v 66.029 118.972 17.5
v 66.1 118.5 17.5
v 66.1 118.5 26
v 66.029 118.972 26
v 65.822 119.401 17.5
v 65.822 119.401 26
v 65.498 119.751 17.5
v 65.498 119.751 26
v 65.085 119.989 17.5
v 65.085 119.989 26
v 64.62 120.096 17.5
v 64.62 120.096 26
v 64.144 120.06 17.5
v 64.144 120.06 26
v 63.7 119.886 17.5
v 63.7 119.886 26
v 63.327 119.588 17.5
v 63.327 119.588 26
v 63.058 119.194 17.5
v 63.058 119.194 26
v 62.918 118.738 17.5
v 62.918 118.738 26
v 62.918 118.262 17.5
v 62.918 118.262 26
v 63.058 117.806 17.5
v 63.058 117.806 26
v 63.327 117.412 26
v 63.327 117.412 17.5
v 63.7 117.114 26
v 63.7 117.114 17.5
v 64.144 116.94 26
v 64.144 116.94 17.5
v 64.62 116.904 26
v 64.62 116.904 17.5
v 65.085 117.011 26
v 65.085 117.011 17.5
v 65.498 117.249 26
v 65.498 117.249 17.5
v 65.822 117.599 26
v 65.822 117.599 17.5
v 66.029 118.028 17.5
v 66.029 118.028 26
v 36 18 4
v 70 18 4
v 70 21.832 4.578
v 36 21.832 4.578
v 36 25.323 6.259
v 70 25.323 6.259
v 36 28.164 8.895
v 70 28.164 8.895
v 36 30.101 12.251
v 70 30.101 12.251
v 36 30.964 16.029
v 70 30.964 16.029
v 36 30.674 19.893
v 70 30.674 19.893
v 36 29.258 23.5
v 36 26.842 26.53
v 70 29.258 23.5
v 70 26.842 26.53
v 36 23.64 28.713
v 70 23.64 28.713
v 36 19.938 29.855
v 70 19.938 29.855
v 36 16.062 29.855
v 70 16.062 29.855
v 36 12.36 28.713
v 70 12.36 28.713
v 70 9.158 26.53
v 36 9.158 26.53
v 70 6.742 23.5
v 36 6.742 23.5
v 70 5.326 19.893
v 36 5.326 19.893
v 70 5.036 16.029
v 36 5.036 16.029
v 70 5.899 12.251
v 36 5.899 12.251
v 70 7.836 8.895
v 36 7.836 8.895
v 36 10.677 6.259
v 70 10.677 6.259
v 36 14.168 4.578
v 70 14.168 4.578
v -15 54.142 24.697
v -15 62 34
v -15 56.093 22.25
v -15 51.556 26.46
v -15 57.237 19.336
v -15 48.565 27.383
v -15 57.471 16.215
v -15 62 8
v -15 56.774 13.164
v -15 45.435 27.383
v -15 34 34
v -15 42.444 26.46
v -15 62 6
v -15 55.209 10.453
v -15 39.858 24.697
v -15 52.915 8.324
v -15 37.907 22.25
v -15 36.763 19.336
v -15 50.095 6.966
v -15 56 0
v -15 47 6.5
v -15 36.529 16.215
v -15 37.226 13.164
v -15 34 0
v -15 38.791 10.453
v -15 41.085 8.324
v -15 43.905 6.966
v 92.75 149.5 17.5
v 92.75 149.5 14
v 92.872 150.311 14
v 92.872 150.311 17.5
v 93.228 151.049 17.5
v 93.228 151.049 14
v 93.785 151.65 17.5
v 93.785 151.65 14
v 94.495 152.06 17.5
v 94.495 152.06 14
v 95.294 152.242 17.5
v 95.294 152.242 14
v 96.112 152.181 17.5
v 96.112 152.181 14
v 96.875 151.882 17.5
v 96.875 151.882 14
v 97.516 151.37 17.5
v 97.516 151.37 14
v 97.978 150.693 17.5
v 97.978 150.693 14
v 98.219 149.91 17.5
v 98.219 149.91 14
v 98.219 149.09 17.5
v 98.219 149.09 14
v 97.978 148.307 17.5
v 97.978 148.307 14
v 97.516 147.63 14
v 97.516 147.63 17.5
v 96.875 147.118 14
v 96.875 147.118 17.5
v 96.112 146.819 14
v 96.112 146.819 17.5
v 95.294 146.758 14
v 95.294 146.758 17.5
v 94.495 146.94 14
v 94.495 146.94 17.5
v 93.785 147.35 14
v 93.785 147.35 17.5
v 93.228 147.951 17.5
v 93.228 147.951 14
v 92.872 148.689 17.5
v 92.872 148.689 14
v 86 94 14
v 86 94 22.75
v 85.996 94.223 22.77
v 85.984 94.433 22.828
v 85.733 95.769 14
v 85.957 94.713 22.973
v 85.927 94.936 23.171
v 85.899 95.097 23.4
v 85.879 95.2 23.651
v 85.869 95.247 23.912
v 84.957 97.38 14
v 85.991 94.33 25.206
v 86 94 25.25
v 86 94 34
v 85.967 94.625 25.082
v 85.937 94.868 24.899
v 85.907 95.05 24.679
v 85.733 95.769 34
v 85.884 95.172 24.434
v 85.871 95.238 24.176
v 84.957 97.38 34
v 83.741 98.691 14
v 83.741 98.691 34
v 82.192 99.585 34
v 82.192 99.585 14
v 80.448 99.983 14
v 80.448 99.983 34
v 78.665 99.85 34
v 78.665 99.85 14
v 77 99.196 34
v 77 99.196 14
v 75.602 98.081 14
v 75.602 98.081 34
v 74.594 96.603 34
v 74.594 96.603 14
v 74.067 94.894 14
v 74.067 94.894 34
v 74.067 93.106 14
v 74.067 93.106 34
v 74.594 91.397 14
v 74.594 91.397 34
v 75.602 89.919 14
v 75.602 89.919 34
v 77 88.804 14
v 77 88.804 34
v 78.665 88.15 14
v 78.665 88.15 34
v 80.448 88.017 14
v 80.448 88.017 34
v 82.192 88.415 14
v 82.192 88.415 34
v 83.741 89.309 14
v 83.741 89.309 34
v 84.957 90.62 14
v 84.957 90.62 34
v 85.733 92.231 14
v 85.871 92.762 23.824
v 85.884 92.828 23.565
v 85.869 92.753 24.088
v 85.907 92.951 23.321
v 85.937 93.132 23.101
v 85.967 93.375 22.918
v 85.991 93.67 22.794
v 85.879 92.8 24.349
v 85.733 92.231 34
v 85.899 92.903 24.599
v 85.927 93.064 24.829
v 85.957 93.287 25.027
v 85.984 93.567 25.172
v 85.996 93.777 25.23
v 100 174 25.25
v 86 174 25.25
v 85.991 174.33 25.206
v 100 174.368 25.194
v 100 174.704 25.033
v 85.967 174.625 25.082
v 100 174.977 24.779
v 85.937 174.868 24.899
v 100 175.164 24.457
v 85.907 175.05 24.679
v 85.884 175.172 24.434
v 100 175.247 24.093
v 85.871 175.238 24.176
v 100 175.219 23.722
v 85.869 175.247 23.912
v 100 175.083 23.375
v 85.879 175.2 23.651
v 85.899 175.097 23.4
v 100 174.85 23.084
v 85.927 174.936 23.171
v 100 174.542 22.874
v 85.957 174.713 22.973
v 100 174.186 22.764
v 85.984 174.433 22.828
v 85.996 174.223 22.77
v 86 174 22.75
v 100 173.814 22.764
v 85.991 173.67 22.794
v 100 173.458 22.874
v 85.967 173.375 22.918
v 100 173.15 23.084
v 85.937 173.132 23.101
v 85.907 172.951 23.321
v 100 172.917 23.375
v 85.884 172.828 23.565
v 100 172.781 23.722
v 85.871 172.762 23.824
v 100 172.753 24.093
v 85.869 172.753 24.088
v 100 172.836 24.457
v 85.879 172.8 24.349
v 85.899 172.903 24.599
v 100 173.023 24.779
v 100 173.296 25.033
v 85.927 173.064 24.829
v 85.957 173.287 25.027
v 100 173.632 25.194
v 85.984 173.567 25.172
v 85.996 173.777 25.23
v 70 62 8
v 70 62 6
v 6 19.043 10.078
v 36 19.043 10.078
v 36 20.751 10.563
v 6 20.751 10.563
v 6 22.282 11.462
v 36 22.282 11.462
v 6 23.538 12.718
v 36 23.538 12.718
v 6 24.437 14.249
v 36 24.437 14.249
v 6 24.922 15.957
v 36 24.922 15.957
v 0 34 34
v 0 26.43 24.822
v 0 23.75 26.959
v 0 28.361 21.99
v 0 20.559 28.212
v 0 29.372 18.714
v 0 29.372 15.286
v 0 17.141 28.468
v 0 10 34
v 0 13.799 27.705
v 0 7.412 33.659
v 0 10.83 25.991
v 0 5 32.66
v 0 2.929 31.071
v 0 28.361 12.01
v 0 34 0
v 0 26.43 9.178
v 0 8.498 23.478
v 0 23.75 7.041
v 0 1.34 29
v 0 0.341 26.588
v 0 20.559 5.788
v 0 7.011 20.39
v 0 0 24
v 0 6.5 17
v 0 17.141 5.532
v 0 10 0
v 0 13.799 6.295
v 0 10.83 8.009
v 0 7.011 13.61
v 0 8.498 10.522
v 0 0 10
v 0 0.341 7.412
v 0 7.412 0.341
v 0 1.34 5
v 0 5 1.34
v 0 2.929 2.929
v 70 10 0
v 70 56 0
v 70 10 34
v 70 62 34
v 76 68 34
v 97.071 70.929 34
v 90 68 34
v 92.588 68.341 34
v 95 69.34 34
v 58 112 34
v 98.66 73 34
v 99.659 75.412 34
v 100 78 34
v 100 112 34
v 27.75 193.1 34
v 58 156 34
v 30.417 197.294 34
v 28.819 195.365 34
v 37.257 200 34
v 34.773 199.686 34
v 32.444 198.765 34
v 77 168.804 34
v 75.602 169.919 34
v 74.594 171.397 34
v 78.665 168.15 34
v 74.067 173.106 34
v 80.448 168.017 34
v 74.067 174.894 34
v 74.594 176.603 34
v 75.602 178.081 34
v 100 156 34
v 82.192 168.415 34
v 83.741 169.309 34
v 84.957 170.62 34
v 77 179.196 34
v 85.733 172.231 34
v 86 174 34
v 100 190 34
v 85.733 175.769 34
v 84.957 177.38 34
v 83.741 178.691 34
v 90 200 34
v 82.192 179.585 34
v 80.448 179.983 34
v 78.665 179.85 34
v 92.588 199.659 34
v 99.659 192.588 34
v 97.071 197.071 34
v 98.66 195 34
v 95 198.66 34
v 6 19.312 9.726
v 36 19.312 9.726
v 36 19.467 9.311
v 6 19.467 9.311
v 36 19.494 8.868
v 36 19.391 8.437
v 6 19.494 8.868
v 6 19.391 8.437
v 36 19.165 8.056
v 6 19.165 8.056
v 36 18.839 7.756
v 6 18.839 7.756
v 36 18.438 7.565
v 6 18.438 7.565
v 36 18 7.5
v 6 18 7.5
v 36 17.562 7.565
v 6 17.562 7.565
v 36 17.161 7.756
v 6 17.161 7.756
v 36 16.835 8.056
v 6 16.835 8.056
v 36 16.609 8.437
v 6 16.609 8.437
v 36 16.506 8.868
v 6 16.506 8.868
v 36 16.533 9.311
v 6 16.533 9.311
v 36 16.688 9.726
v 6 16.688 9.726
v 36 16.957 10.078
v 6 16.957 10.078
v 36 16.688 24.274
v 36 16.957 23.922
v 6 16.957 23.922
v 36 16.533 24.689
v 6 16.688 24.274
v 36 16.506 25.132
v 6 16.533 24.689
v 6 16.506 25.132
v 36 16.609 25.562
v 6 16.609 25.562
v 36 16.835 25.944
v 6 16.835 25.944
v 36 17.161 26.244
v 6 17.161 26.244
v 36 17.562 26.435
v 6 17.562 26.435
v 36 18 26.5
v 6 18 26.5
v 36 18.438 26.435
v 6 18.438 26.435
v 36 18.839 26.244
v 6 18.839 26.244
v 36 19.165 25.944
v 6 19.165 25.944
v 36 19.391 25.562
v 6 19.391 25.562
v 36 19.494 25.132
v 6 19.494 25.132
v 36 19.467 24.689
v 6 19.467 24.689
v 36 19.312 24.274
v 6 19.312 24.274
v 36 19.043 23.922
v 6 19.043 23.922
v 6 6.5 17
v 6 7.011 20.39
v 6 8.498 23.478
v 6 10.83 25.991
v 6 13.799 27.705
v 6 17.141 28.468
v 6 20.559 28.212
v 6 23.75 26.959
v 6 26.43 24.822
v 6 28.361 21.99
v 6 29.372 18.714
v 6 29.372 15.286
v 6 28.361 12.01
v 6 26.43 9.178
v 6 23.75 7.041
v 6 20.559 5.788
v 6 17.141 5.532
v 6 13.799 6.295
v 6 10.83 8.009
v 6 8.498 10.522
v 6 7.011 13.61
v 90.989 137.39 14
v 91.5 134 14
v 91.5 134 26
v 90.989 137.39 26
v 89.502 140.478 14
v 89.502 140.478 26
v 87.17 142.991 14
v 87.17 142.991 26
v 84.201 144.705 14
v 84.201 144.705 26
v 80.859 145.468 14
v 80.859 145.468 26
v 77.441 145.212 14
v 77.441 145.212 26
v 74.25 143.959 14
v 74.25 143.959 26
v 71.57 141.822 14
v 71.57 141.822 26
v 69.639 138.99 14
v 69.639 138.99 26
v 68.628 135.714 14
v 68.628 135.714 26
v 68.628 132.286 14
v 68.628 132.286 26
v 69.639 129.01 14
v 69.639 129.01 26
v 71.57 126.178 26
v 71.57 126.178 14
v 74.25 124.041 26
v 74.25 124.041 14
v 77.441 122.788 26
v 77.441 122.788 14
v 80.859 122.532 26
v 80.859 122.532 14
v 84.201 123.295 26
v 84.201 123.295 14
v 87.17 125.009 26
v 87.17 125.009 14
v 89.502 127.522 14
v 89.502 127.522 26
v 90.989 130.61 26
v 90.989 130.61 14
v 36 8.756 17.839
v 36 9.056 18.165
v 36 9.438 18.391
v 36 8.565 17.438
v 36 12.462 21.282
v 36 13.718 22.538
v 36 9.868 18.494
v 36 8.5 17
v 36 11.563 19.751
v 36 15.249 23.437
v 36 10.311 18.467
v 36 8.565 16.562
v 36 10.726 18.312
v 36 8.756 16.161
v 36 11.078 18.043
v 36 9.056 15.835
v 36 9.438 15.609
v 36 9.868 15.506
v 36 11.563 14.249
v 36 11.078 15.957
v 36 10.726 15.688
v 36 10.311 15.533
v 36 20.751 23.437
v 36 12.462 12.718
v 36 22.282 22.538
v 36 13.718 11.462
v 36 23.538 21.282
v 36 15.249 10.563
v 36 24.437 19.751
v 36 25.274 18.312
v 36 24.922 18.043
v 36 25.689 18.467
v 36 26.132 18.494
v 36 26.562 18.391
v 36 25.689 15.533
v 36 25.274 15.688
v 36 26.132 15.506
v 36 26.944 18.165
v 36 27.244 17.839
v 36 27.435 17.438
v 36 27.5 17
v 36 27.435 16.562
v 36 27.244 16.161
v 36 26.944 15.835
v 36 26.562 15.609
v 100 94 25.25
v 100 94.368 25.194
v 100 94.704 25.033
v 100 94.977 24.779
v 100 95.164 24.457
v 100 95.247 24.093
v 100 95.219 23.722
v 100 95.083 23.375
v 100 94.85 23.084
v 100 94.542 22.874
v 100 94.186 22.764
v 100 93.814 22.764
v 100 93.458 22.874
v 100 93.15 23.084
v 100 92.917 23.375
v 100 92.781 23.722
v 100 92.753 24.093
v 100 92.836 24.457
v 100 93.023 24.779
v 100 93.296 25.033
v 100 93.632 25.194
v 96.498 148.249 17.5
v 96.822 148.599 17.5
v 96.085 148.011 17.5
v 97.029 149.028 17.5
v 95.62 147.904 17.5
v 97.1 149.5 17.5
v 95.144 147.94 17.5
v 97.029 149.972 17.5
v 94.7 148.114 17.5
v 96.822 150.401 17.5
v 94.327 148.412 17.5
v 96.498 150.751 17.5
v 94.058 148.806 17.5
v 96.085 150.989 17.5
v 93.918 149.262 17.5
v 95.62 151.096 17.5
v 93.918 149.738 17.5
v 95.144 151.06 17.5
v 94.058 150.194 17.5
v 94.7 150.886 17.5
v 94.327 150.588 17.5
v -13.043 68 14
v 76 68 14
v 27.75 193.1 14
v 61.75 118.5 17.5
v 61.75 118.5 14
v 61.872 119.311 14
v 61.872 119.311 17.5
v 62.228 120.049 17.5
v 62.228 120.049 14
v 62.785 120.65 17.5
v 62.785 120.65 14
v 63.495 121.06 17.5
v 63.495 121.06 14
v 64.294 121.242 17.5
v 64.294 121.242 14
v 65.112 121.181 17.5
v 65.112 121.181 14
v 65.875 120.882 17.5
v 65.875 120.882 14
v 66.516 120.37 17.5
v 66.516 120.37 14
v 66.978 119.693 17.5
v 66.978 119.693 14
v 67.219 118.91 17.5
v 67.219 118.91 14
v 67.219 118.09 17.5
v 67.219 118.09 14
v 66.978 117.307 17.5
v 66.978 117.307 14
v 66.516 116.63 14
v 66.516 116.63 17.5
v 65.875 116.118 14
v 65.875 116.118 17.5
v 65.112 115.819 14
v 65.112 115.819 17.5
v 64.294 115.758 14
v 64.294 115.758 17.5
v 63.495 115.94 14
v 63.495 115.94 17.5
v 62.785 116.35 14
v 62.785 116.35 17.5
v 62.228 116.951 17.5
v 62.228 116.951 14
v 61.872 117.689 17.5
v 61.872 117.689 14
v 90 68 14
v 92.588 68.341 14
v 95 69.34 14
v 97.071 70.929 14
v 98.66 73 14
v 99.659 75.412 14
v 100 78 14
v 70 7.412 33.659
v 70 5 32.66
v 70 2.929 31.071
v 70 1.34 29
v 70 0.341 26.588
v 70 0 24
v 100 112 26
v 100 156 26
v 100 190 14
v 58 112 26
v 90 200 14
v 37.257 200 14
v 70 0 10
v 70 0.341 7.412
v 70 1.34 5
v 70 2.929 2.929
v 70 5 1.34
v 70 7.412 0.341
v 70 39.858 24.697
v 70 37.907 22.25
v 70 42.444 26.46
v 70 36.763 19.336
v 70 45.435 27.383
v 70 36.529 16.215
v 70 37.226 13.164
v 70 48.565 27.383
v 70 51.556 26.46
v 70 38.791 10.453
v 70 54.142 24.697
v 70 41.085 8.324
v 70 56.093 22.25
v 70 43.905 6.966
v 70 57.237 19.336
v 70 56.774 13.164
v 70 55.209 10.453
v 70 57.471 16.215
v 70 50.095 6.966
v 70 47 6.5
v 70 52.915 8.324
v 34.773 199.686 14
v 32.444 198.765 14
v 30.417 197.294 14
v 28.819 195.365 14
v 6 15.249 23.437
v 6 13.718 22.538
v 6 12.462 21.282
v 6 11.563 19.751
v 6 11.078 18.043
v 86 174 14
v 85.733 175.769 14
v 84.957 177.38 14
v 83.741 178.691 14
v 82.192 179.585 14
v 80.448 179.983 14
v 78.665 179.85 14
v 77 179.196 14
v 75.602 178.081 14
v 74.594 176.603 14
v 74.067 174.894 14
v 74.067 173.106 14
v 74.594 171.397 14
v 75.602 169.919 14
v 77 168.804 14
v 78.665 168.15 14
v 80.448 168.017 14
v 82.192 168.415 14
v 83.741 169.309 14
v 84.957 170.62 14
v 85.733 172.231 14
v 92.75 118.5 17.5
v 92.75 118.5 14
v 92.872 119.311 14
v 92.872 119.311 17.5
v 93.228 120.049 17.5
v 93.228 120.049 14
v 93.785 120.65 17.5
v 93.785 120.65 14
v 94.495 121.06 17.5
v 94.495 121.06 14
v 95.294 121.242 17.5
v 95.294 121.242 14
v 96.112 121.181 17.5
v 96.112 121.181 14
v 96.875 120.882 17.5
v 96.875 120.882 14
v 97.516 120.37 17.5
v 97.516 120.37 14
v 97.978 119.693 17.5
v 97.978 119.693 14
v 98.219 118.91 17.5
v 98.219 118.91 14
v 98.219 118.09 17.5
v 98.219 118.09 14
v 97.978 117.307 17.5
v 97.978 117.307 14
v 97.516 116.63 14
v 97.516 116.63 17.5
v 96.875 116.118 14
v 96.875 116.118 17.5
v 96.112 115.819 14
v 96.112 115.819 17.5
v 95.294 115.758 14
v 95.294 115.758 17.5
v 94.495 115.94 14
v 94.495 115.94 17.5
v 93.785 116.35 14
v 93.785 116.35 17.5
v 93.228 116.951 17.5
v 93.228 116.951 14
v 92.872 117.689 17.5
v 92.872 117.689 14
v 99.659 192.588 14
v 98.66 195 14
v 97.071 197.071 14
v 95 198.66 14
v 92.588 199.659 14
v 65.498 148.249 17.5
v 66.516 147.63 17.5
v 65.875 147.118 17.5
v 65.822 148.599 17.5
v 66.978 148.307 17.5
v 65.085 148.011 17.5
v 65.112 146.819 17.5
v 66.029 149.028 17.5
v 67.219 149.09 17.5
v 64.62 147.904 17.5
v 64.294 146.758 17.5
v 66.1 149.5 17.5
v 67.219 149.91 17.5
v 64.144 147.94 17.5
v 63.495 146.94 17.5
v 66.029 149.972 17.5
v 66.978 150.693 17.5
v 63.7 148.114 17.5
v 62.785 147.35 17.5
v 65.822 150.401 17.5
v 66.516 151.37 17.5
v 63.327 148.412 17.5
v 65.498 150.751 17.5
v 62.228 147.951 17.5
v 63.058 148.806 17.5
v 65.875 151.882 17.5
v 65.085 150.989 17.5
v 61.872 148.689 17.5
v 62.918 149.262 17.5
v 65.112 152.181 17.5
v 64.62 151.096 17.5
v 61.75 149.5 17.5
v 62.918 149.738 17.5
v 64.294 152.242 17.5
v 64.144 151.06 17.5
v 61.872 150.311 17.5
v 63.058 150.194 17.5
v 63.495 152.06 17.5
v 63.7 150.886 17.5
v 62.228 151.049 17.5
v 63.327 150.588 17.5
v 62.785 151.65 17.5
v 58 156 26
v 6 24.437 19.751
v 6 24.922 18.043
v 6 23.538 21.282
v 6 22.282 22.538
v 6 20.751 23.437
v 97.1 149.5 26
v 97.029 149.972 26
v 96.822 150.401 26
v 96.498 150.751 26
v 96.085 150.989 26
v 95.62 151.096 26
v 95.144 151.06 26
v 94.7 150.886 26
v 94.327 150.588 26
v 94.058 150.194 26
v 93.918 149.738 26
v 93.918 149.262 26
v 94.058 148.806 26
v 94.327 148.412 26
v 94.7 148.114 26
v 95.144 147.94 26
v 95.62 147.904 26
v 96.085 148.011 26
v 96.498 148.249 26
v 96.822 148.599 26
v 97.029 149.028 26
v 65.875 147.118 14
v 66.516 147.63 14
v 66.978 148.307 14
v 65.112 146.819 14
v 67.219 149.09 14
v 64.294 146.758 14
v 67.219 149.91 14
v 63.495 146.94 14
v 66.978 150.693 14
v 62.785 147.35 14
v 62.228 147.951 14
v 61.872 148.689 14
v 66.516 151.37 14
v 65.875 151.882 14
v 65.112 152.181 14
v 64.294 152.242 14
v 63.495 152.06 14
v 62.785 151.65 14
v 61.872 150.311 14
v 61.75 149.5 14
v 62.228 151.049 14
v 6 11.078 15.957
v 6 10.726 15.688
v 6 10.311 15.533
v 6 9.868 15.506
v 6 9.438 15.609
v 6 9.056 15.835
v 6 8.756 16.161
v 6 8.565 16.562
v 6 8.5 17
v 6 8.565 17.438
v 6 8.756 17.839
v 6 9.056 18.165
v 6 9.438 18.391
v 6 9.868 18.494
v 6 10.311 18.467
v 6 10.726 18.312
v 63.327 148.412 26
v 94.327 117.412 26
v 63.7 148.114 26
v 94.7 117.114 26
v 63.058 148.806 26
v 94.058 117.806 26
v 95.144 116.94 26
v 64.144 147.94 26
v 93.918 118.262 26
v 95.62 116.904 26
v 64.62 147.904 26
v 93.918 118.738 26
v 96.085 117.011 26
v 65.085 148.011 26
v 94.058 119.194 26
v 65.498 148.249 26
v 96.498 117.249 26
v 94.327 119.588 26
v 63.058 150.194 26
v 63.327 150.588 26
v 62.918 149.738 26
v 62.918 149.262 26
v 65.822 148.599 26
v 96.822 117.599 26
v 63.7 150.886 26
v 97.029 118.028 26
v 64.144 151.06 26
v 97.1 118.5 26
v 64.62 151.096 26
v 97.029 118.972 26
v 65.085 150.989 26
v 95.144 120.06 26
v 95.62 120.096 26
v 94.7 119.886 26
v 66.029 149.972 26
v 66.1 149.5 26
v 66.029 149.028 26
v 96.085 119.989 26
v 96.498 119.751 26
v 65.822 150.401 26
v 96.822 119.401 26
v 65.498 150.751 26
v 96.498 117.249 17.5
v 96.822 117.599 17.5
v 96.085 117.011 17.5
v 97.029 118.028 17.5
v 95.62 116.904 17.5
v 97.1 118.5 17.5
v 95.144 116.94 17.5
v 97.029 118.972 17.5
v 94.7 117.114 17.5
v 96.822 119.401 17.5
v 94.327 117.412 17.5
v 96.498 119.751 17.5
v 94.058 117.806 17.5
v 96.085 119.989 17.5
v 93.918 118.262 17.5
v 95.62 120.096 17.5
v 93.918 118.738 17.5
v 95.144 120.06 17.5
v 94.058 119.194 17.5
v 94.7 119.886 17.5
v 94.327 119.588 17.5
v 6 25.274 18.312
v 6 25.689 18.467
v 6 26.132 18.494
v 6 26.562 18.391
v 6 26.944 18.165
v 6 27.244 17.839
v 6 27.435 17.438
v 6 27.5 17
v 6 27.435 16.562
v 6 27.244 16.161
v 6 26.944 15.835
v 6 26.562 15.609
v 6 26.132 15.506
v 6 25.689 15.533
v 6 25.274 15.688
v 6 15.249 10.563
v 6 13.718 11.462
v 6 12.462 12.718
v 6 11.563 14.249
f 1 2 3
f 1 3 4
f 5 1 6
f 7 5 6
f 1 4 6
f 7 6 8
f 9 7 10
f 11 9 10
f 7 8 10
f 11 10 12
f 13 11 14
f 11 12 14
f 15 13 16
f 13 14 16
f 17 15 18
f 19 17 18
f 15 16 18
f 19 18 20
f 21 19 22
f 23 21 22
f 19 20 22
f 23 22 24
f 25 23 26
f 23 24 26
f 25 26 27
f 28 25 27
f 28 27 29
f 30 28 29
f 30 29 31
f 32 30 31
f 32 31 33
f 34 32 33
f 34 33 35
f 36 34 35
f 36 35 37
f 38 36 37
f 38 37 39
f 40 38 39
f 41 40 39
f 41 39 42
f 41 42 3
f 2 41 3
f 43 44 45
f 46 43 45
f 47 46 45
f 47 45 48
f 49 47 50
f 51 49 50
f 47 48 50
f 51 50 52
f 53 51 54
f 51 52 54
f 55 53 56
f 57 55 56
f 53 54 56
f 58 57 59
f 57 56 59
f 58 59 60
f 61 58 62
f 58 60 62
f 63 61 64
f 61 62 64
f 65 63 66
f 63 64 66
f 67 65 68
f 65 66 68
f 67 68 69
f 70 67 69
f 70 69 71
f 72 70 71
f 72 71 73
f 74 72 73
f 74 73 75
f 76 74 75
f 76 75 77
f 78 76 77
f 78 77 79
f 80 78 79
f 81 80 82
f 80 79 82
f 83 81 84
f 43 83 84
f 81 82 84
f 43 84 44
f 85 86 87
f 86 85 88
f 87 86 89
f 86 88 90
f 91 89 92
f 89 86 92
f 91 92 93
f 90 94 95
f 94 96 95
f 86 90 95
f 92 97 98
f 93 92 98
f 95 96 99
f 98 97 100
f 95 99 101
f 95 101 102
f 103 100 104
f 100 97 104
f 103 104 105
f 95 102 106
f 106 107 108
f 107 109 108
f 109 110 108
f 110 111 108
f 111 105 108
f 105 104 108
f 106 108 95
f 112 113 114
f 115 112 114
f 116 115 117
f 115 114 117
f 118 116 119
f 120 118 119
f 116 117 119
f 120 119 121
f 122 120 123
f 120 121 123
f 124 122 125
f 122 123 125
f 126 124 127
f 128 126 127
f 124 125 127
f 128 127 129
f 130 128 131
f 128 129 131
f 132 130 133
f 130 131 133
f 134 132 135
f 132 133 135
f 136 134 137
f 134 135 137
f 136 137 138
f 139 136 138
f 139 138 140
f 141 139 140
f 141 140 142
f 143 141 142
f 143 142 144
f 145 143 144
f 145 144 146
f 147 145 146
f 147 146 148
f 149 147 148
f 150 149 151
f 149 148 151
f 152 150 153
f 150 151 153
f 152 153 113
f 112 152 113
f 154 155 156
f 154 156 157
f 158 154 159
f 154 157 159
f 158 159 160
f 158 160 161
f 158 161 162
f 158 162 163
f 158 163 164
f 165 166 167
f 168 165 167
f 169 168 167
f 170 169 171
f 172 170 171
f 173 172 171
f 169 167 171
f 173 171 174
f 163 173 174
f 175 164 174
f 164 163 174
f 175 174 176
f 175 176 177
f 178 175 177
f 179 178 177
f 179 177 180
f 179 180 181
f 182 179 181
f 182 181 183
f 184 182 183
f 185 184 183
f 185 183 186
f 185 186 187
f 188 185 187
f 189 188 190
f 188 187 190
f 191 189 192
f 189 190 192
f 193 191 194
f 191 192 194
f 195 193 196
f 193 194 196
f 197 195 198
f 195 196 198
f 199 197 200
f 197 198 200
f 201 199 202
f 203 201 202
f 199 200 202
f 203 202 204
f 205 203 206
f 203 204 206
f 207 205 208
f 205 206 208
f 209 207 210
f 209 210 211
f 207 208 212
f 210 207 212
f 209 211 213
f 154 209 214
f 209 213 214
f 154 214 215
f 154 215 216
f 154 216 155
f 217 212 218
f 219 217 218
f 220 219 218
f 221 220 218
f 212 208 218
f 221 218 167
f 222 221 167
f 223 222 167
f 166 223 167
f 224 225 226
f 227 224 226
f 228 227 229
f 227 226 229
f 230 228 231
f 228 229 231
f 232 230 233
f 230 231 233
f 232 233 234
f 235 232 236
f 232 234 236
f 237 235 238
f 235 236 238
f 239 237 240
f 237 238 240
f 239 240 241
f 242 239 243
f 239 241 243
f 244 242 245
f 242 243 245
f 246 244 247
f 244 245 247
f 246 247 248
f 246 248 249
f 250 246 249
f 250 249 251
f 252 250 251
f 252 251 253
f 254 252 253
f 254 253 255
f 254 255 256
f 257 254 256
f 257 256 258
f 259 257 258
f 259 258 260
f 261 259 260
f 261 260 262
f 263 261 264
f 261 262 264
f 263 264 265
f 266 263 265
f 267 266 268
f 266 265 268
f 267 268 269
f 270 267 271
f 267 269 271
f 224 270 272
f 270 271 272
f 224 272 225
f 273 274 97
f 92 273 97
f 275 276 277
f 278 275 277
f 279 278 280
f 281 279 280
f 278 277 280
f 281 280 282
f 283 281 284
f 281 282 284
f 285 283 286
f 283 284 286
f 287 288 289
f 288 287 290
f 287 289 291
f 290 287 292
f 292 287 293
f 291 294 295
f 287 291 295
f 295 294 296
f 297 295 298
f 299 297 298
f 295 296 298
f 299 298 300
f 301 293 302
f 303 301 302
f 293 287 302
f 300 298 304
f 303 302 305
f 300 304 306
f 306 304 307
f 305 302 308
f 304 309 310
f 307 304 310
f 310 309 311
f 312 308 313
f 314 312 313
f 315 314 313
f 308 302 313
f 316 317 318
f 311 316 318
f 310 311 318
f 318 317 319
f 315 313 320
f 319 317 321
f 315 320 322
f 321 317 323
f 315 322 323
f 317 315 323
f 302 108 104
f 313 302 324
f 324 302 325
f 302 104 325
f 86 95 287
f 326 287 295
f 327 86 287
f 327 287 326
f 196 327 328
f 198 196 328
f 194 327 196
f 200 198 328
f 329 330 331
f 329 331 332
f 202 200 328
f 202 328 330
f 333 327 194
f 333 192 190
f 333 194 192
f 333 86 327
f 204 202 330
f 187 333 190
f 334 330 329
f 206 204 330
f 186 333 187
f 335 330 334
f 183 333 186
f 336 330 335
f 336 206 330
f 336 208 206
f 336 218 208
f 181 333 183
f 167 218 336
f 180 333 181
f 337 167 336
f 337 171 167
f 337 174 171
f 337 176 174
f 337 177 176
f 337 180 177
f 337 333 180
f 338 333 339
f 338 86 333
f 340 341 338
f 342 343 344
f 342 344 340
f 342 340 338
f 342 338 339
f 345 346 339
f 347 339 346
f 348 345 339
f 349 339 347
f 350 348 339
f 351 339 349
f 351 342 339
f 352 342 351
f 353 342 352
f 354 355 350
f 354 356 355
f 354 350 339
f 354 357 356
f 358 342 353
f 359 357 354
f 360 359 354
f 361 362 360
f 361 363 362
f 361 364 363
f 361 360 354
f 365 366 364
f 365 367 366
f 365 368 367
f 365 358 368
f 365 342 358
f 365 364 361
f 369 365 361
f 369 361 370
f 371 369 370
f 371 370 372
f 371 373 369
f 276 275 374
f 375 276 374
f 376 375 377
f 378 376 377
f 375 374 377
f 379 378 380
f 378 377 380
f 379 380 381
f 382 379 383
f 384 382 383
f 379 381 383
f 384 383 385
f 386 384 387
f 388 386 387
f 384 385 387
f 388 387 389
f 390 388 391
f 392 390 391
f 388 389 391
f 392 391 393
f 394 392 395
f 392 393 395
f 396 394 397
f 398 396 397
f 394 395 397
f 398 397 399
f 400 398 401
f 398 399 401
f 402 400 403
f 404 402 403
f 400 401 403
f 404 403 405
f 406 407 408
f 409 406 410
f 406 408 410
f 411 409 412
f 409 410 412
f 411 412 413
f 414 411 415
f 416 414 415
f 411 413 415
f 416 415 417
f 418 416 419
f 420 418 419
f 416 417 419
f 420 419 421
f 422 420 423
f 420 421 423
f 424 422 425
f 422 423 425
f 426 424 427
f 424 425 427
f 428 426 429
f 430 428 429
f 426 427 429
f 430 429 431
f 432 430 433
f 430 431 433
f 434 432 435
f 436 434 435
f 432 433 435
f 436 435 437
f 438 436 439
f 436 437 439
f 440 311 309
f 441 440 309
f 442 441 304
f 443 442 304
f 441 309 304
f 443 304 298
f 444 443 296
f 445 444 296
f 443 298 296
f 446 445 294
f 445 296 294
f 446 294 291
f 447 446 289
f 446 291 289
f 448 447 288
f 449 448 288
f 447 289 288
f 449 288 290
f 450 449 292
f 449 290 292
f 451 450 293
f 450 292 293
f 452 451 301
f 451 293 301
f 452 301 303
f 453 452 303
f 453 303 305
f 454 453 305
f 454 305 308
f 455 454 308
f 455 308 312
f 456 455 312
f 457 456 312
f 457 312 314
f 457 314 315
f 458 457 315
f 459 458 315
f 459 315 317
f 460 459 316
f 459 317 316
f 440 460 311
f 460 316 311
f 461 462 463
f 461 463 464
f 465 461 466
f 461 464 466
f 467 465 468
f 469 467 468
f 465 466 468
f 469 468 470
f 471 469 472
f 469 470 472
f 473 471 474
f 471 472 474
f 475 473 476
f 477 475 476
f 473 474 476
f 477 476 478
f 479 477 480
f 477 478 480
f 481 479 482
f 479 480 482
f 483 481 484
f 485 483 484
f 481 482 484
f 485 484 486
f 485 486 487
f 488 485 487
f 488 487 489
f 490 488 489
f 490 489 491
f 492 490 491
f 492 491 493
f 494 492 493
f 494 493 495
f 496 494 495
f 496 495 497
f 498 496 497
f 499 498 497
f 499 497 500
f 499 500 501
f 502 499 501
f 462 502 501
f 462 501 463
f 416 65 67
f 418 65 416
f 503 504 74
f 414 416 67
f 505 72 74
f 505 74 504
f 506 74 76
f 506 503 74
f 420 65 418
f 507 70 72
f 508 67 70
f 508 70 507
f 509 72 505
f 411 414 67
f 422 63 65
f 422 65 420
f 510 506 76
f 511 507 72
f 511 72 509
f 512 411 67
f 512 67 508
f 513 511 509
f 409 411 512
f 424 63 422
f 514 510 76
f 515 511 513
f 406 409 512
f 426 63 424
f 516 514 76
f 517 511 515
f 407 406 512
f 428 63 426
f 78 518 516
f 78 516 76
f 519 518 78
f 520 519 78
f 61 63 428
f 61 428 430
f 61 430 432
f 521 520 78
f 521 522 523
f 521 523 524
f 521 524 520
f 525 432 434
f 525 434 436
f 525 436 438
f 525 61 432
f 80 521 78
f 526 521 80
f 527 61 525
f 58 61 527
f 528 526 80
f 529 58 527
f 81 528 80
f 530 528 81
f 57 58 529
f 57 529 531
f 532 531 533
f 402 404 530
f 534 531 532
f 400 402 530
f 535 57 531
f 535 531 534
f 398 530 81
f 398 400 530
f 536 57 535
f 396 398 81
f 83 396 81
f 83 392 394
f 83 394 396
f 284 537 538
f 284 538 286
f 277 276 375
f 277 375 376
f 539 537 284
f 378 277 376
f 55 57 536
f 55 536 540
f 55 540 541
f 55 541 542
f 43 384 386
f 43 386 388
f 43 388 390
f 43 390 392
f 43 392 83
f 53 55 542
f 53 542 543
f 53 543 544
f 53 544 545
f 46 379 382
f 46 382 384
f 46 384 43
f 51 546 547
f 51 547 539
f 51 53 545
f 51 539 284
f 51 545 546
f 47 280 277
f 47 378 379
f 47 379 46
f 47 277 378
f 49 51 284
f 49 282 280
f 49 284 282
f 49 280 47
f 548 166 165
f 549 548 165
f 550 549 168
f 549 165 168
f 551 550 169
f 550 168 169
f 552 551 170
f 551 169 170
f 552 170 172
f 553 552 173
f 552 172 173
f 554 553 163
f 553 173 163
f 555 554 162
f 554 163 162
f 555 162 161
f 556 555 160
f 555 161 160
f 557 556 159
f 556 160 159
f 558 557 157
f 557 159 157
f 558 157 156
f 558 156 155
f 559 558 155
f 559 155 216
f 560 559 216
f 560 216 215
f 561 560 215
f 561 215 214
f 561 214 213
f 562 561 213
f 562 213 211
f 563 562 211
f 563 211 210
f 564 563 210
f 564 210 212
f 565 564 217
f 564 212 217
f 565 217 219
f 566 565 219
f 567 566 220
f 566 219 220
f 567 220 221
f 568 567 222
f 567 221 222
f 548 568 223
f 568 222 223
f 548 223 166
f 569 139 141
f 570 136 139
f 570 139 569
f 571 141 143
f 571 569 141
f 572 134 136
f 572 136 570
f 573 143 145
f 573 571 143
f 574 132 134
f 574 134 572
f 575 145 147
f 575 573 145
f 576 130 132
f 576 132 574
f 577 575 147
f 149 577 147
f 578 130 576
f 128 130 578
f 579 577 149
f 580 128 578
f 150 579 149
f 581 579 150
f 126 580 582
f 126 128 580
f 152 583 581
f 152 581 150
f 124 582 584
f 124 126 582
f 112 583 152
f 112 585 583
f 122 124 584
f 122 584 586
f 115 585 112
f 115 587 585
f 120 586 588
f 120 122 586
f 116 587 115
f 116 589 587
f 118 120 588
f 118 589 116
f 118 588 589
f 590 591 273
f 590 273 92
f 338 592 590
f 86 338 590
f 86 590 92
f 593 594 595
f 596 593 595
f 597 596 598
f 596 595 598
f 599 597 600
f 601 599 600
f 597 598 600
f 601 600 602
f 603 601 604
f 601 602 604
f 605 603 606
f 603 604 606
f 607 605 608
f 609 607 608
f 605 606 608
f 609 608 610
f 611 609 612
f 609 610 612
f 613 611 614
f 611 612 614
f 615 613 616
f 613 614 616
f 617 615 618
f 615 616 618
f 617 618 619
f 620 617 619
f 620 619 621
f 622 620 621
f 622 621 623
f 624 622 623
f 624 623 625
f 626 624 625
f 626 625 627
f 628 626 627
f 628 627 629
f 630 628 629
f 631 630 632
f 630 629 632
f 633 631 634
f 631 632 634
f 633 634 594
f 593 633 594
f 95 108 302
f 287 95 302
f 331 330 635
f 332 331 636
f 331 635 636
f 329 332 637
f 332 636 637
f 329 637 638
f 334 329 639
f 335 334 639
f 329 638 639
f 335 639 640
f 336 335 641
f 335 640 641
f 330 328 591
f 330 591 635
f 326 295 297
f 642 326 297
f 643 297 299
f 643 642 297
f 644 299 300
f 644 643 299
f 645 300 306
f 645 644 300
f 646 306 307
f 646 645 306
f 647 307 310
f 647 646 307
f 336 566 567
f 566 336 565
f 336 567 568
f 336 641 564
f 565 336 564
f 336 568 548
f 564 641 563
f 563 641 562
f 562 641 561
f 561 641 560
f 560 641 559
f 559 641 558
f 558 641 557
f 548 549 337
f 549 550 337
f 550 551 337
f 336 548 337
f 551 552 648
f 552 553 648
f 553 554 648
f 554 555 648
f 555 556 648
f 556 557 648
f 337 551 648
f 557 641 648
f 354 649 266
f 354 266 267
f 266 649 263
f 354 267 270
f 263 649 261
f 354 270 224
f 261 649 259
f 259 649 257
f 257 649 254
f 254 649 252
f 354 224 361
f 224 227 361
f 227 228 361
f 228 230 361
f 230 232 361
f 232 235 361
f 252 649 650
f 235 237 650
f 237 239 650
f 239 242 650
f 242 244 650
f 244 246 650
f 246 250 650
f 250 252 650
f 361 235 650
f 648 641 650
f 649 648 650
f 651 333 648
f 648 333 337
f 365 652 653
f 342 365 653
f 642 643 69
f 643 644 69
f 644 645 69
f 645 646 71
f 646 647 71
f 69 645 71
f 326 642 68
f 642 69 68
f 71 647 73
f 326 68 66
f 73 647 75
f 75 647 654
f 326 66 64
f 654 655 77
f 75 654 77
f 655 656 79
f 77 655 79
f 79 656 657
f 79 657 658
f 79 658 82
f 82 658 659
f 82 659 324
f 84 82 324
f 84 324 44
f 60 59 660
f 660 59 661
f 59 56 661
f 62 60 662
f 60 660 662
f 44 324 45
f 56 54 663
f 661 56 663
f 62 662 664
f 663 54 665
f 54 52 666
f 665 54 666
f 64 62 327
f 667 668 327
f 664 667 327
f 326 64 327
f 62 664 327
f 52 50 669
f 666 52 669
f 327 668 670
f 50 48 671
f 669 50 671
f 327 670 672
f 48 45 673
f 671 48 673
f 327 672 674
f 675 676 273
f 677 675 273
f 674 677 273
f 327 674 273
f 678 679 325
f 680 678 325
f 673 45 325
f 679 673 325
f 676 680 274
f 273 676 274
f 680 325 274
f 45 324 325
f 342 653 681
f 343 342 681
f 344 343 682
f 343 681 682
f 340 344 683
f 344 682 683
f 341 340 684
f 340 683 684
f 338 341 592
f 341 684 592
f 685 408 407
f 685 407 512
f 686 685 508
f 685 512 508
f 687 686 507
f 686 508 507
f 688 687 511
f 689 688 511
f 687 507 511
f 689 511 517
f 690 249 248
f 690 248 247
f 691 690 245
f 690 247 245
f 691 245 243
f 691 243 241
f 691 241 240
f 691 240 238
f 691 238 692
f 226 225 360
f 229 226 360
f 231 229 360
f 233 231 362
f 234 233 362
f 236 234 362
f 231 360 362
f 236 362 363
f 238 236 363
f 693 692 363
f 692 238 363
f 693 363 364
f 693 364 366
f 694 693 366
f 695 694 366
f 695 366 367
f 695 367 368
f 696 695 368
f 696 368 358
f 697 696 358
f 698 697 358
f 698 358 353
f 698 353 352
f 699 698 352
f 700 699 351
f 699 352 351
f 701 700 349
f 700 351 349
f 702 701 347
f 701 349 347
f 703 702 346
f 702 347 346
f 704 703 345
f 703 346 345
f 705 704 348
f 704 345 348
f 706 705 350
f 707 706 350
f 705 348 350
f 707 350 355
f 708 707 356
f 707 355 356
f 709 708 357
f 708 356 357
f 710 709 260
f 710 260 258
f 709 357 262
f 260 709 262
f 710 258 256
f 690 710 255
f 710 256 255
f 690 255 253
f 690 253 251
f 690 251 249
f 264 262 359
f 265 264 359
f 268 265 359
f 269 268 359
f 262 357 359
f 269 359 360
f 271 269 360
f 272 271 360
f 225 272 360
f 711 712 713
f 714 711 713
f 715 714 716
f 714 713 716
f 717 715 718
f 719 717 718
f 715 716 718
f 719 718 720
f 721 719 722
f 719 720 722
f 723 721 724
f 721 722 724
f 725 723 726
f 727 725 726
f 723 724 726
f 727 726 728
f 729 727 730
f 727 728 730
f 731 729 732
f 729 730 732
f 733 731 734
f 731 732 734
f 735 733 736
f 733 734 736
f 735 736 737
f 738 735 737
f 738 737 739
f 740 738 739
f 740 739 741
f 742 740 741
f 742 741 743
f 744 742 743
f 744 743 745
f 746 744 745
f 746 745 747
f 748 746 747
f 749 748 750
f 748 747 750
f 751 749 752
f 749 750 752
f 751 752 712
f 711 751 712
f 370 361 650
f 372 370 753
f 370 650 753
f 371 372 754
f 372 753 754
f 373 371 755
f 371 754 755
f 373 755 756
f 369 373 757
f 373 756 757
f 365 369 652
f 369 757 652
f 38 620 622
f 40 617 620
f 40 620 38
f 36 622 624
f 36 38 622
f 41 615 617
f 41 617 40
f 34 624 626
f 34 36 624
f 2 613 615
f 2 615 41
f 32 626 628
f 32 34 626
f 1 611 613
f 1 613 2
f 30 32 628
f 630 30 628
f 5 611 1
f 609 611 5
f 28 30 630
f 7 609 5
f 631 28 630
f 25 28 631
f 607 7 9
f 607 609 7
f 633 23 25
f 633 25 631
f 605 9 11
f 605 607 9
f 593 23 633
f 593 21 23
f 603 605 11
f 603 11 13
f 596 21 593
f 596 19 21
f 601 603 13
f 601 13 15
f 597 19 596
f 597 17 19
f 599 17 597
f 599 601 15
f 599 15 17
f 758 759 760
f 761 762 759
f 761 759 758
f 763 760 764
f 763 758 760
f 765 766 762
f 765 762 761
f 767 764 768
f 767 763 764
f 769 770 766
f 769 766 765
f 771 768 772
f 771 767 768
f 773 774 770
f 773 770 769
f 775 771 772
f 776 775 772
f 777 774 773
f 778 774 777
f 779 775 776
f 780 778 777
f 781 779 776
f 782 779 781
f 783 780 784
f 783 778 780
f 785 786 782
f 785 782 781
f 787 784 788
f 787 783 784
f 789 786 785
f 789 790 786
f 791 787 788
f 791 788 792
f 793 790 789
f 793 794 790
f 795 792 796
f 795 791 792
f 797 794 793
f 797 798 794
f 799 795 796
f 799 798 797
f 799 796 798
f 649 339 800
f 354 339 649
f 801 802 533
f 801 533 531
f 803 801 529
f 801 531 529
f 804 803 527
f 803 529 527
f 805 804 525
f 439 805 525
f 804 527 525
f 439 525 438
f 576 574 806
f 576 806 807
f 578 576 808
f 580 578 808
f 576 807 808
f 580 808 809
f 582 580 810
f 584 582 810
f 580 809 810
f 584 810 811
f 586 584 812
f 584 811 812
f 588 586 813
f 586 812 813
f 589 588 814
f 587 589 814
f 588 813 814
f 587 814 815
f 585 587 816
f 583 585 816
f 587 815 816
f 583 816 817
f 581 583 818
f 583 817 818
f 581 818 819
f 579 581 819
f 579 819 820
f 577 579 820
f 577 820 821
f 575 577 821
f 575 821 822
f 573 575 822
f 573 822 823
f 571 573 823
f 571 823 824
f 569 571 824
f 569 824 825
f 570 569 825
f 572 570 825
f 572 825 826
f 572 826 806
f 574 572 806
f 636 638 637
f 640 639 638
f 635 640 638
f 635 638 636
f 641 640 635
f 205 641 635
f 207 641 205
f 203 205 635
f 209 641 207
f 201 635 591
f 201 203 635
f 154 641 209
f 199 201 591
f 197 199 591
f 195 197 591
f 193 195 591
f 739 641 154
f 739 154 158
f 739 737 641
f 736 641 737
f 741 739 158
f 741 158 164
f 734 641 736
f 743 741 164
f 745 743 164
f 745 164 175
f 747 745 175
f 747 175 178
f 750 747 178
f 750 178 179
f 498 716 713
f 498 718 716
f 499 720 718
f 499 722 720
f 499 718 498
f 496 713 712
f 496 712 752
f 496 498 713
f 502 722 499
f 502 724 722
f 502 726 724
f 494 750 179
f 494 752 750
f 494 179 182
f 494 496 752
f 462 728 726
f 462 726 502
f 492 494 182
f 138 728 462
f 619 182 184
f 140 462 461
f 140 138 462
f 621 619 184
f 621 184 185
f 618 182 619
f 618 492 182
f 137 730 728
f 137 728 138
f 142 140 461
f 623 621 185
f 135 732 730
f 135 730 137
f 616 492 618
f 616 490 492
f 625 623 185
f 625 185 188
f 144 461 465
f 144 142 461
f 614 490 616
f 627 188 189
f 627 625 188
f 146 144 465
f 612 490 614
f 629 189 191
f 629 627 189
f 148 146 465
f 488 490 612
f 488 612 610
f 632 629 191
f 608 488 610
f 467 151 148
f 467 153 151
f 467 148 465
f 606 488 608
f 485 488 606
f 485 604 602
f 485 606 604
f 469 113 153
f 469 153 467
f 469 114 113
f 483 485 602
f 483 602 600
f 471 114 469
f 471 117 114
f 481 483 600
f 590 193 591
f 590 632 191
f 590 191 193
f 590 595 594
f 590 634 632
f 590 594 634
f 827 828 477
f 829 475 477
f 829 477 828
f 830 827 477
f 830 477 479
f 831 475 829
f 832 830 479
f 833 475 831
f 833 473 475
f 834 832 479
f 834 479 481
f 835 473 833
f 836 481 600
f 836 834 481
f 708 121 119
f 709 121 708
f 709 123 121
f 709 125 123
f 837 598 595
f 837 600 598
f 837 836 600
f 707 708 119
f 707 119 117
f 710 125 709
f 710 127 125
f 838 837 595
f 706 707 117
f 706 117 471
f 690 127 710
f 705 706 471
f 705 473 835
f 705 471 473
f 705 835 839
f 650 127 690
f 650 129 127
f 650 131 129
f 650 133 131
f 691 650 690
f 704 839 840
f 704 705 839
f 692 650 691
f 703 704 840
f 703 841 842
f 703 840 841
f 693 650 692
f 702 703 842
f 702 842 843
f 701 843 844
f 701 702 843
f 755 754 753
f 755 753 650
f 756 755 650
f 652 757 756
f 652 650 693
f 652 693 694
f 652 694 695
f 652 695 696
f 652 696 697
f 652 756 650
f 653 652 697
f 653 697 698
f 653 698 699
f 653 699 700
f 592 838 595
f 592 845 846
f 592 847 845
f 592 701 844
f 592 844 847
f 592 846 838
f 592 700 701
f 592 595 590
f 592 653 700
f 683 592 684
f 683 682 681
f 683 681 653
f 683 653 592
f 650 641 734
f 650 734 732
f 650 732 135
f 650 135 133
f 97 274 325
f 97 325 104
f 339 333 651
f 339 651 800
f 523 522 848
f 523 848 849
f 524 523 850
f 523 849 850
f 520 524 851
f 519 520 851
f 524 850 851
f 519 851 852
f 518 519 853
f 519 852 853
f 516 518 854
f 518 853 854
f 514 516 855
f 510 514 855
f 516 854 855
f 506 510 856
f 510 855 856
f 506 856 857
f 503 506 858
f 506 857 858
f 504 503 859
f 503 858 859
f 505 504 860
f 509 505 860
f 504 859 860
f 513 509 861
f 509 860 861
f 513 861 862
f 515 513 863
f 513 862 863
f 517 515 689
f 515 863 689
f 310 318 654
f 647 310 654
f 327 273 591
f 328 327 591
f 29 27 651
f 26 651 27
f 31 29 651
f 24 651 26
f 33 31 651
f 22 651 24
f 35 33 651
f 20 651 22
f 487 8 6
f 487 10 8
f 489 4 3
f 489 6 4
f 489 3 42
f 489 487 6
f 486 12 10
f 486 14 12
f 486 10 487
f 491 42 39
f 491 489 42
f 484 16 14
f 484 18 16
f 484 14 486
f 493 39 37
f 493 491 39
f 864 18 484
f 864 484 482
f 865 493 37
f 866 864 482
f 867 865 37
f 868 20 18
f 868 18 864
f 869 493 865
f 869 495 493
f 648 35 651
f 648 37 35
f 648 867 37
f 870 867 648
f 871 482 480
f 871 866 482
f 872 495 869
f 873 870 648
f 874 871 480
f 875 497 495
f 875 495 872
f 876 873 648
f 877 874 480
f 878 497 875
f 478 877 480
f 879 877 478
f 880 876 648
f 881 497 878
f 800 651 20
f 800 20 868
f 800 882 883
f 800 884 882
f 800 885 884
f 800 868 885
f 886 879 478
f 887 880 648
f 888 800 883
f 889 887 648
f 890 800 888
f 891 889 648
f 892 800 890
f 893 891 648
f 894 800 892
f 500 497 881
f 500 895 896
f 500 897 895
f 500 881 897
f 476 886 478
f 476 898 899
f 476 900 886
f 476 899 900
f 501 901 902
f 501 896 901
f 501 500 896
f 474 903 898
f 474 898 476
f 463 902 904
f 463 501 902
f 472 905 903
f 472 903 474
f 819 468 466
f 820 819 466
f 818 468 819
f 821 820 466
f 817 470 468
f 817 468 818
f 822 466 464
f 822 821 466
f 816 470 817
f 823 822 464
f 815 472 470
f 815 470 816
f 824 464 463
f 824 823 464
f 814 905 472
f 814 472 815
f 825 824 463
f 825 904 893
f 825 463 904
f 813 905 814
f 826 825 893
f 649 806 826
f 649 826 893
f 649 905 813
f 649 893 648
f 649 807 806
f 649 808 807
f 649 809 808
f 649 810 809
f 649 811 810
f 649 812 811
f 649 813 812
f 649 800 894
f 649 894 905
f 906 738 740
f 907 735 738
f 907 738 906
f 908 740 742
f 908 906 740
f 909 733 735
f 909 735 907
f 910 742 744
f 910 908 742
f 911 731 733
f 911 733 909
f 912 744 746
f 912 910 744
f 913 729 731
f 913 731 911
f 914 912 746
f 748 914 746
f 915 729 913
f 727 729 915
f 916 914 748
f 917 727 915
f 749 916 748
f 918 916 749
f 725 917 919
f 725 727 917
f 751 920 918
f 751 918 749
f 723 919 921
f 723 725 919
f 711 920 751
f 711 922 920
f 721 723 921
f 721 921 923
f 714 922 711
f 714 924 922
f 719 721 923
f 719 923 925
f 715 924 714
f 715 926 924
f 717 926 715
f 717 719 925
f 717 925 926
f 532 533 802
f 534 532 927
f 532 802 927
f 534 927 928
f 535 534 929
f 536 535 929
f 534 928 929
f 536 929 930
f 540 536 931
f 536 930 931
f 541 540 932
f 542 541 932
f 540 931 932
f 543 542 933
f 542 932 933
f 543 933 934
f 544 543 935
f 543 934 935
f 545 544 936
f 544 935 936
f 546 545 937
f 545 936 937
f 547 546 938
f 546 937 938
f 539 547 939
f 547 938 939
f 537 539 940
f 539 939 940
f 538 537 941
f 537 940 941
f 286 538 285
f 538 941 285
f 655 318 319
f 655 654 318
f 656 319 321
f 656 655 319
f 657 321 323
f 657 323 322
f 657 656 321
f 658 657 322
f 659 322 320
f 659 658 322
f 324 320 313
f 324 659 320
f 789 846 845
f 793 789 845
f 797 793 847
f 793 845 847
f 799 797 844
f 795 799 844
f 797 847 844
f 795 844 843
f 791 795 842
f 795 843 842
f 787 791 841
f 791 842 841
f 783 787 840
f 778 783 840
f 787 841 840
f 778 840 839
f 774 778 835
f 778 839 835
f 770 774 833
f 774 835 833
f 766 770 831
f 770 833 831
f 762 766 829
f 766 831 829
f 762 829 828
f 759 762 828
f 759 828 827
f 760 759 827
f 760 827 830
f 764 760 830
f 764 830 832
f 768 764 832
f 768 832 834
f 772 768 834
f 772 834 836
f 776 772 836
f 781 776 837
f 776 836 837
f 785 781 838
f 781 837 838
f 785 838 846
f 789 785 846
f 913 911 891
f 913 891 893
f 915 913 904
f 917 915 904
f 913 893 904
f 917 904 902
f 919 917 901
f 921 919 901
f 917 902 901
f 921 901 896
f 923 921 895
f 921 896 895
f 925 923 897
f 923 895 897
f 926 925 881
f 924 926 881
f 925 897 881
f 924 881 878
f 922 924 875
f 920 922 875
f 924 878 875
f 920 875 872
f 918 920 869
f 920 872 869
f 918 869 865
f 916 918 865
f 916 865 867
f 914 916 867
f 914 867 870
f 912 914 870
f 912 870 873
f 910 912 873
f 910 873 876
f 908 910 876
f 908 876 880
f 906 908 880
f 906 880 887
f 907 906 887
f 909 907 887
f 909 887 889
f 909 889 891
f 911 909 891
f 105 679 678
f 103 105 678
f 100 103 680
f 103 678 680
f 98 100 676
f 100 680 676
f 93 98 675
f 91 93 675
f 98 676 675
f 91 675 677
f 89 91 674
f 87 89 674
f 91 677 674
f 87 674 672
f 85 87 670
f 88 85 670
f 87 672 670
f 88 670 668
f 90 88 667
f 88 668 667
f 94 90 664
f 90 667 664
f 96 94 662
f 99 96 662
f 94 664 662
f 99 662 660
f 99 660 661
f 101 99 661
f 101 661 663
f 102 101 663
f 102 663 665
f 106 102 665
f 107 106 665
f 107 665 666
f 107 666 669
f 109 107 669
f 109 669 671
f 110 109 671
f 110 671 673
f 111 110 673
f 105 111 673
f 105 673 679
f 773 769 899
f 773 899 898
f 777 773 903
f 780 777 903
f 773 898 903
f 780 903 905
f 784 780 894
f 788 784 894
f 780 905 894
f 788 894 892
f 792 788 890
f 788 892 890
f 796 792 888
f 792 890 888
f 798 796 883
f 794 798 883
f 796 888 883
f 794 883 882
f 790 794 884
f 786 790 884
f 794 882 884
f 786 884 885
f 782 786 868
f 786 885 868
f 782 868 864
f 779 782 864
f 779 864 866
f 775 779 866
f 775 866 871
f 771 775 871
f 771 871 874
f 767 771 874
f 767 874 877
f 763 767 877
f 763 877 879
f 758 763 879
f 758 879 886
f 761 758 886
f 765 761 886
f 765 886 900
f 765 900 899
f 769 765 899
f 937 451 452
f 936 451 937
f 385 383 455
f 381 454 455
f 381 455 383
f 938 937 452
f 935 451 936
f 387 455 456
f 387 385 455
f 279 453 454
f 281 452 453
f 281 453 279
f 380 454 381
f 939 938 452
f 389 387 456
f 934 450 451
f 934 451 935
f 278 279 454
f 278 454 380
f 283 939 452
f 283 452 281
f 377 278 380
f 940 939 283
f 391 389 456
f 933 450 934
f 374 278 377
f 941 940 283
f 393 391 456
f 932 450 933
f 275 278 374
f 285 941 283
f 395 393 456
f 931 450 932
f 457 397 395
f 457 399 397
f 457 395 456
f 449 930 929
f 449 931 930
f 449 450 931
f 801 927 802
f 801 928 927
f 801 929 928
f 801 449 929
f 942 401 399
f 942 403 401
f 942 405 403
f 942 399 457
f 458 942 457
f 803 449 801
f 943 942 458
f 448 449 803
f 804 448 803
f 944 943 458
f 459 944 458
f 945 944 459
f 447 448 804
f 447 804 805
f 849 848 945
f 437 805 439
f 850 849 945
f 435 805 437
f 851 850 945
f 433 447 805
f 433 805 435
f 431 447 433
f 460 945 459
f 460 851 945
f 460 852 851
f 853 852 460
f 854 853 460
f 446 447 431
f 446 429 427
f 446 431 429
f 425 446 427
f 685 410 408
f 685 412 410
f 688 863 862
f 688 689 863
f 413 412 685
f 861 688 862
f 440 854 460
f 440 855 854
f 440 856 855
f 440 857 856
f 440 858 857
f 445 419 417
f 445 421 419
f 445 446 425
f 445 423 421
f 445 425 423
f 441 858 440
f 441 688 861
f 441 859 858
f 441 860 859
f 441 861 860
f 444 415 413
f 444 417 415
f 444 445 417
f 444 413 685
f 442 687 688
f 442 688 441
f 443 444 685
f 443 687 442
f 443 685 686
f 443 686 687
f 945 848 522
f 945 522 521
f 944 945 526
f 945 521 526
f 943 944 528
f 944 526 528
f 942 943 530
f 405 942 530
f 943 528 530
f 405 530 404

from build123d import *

# Parameters (mm, degrees)
BOSS_EXTRUDE2_DEPTH   = 34
SKETCH3_W             = 180.49084133
SKETCH3_H             = 138
CUT_EXTRUDE1_DEPTH    = 14
SKETCH4_R             = 11.5
SKETCH4_R_2           = 1.6
SKETCH4_R_3           = 6
CUT_EXTRUDE3_DEPTH    = 227.1769219
SKETCH5_W             = 42
SKETCH5_H             = 44
CUT_EXTRUDE4_DEPTH    = 8
M3_TAPPED_HOLE1_D     = 2.5
M3_TAPPED_HOLE1_DEPTH = 20
M3_TAPPED_HOLE1_TIP   = 0.751075774
SKETCH9_R             = 10.5
SKETCH9_R_2           = 7
CUT_EXTRUDE6_DEPTH    = 220.956813959
SKETCH10_R            = 11.5
CUT_EXTRUDE7_DEPTH    = 6
SKETCH11_R            = 13
CUT_EXTRUDE8_DEPTH    = 34
CHAMFER1_SIZE         = 6
FILLET1_R             = 10
SKETCH12_R            = 1.5
CUT_EXTRUDE9_DEPTH    = 30
SKETCH13_R            = 2.75
CUT_EXTRUDE10_DEPTH   = 3.5


with BuildPart() as part:
    # Sketch1 → Boss-Extrude2 (new body)
    with BuildSketch(Plane.XY):
        with BuildLine():
            Line((0, 0), (70, 0))
            Line((70, 0), (70, 62))
            Line((70, 62), (76, 68))
            Line((76, 68), (90, 68))
            ThreePointArc((90, 68), (97.071067812, 70.928932188), (100, 78))
            Line((100, 78), (100, 190))
            ThreePointArc((100, 190), (97.071067812, 197.071067812), (90, 200))
            Line((90, 200), (37.257365568, 200))
            ThreePointArc((37.257365568, 200), (31.383783185, 198.093270661), (27.750067173, 193.100205998))
            Line((27.750067173, 193.100205998), (-15, 62))
            Line((-15, 62), (-15, 34))
            Line((-15, 34), (0, 34))
            Line((0, 34), (0, 0))
        make_face()
    extrude(amount=BOSS_EXTRUDE2_DEPTH)

    # Sketch3 → Cut-Extrude1 (cut)
    with BuildSketch(Plane(origin=(0, 0, 0), x_dir=(-1, 0, 0), z_dir=(0, 0, -1))):
        with Locations((-9.754579335, 131)):
            Rectangle(SKETCH3_W, SKETCH3_H)
    extrude(amount=-CUT_EXTRUDE1_DEPTH, mode=Mode.SUBTRACT)

    # Sketch4 → Cut-Extrude3 (cut, through all)
    with BuildSketch(Plane.XY.offset(34)):
        with Locations((80, 134)):
            Circle(SKETCH4_R)
        with Locations((95.5, 149.5)):
            Circle(SKETCH4_R_2)
        with Locations((95.5, 118.5)):
            Circle(SKETCH4_R_2)
        with Locations((64.5, 118.5)):
            Circle(SKETCH4_R_2)
        with Locations((64.5, 149.5)):
            Circle(SKETCH4_R_2)
        with Locations((80, 174)):
            Circle(SKETCH4_R_3)
        with Locations((80, 94)):
            Circle(SKETCH4_R_3)
    extrude(amount=-CUT_EXTRUDE3_DEPTH, mode=Mode.SUBTRACT)

    # Sketch5 → Cut-Extrude4 (cut)
    with BuildSketch(Plane.XY.offset(34)):
        with Locations((79, 134)):
            Rectangle(SKETCH5_W, SKETCH5_H)
    extrude(amount=-CUT_EXTRUDE4_DEPTH, mode=Mode.SUBTRACT)

    # M3 Tapped Hole1
    with Locations(Plane(origin=(100, 0, 0), x_dir=(0, 0, -1), z_dir=(1, 0, 0))):
        with Locations((-24, 174), (-24, 94)):
            Hole(M3_TAPPED_HOLE1_D / 2, depth=M3_TAPPED_HOLE1_DEPTH)
            with Locations((0, 0, -(M3_TAPPED_HOLE1_DEPTH + M3_TAPPED_HOLE1_TIP / 2))):  # 118° drill point
                Cone(0, M3_TAPPED_HOLE1_D / 2, M3_TAPPED_HOLE1_TIP, mode=Mode.SUBTRACT)

    # Sketch9 → Cut-Extrude6 (cut, through all)
    with BuildSketch(Plane(origin=(70, 0, 0), x_dir=(0, 0, -1), z_dir=(1, 0, 0))):
        with Locations((-17, 47)):
            Circle(SKETCH9_R)
        with Locations((-17, 18)):
            Circle(SKETCH9_R_2)
    extrude(amount=-CUT_EXTRUDE6_DEPTH, mode=Mode.SUBTRACT)

    # Sketch10 → Cut-Extrude7 (cut)
    with BuildSketch(Plane.ZY):
        with Locations(Location((17, 18, 0), (0, 0, 270))):
            Circle(SKETCH10_R)
    extrude(amount=-CUT_EXTRUDE7_DEPTH, mode=Mode.SUBTRACT)

    # Sketch11 → Cut-Extrude8 (cut)
    with BuildSketch(Plane(origin=(70, 0, 0), x_dir=(0, 0, -1), z_dir=(1, 0, 0))):
        with Locations((-17, 18)):
            Circle(SKETCH11_R)
    extrude(amount=-CUT_EXTRUDE8_DEPTH, mode=Mode.SUBTRACT)

    # Chamfer1
    chamfer1_edges = [part.edges().sort_by_distance(p)[0] for p in [
        (27.5, 62, 0),
        (27.5, 62, 14),
    ]]
    chamfer(chamfer1_edges, length=CHAMFER1_SIZE)

    # Fillet1
    fillet1_edges = [part.edges().sort_by_distance(p)[0] for p in [
        (35, 0, 0),
        (35, 0, 34),
    ]]
    fillet(fillet1_edges, radius=FILLET1_R)

    # Sketch12 → Cut-Extrude9 (cut)
    with BuildSketch(Plane.ZY.offset(-6)):
        with Locations((17, 26)):
            Circle(SKETCH12_R)
        with Locations((25, 18)):
            Circle(SKETCH12_R)
        with Locations((17, 10)):
            Circle(SKETCH12_R)
        with Locations((9, 18)):
            Circle(SKETCH12_R)
    extrude(amount=-CUT_EXTRUDE9_DEPTH, mode=Mode.SUBTRACT)

    # Sketch13 → Cut-Extrude10 (cut)
    with BuildSketch(Plane(origin=(0, 0, 14), x_dir=(-1, 0, 0), z_dir=(0, 0, -1))):
        with Locations((-95.5, 149.5)):
            Circle(SKETCH13_R)
        with Locations((-64.5, 149.5)):
            Circle(SKETCH13_R)
        with Locations((-64.5, 118.5)):
            Circle(SKETCH13_R)
        with Locations((-95.5, 118.5)):
            Circle(SKETCH13_R)
    extrude(amount=-CUT_EXTRUDE10_DEPTH, mode=Mode.SUBTRACT)


solid = part.part
